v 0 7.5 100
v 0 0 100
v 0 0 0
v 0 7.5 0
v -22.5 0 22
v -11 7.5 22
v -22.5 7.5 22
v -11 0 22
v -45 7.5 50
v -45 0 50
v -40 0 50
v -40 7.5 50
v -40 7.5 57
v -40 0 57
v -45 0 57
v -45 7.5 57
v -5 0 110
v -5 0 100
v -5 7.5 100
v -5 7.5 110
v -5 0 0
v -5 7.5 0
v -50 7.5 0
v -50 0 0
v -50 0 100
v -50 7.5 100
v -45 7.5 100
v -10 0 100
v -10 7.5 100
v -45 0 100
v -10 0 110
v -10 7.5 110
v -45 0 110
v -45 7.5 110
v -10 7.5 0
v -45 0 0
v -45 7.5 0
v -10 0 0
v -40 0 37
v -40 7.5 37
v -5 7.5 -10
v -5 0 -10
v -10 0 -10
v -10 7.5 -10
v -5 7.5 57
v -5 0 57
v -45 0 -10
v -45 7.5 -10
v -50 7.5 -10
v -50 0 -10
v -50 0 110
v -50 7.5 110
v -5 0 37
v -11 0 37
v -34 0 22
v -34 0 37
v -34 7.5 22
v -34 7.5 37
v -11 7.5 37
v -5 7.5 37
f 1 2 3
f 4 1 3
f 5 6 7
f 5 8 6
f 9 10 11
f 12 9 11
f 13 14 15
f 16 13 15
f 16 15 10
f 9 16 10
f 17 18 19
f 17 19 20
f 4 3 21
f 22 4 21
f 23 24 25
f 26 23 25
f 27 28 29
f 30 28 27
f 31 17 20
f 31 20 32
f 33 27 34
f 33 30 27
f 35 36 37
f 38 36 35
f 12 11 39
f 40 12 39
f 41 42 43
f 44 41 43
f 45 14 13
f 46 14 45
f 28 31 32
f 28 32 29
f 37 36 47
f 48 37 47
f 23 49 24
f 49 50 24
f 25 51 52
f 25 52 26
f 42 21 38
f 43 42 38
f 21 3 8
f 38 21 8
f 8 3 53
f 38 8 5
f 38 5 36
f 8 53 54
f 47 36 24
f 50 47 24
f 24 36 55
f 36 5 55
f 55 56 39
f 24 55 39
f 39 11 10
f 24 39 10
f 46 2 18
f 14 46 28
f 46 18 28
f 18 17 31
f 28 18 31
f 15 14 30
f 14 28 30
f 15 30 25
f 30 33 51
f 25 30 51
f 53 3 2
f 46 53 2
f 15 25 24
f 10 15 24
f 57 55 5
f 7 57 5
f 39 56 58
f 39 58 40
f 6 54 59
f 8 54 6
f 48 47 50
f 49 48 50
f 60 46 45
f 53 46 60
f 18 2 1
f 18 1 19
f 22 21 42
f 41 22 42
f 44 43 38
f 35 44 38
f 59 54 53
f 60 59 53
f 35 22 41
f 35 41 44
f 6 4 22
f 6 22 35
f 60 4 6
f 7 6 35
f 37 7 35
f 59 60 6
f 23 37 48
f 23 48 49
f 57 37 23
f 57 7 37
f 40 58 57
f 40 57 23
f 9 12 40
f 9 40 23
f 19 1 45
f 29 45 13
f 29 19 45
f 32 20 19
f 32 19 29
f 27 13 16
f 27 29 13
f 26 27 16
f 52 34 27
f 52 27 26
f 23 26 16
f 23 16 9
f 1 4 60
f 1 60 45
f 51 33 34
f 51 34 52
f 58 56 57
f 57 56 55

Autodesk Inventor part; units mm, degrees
ref_plane "YZ Plane" through (0, 0, 0) normal (1, 0, 0) x (0, 1, 0)
ref_plane "XZ Plane" through (0, 0, 0) normal (0, 1, 0) x (-1, 0, 0)
ref_plane "XY Plane" through (0, 0, 0) normal (0, 0, 1) x (1, 0, 0)
sketch "Sketch1" plane through (0, 0, 0) normal (0, 1, 0) x (-1, 0, 0)
  line L0 (50, 0) -> (50, 100)
  line L1 (0, 100) -> (0, 0)
  line L2 (34, 37) -> (34, 22)
  line L3 (34, 22) -> (22.5, 22)
  line L4 (11, 37) -> (11, 22)
  line L5 (11, 22) -> (22.5, 22)
  line L6 (34, 37) -> (40, 37)
  line L7 (11, 37) -> (5, 37)
  line L8 (40, 57) -> (5, 57)
  line L9 (5, 57) -> (5, 37)
  line L10 (40, 57) -> (45, 57)
  line L11 (45, 57) -> (45, 50)
  line L12 (45, 50) -> (40, 50)
  line L13 (45, 100) -> (45, 110)
  line L14 (45, 110) -> (50, 110)
  line L15 (50, 110) -> (50, 100)
  line L16 (5, 100) -> (5, 110)
  line L17 (45, 0) -> (45, -10)
  line L18 (45, -10) -> (50, -10)
  line L19 (50, -10) -> (50, 0)
  line L20 (5, 0) -> (5, -10)
  line L21 (40, 50) -> (40, 37)
  line L22 (5, 110) -> (10, 110)
  line L23 (10, 110) -> (10, 100)
  line L24 (5, 100) -> (5, 110)
  line L25 (5, -10) -> (10, -10)
  line L26 (10, -10) -> (10, 0)
  line L27 (5, 0) -> (5, -10)
  line L28 (0, 100) -> (5, 100)
  line L29 (10, 100) -> (45, 100)
  line L30 (0, 0) -> (5, 0)
  line L31 (45, 0) -> (10, 0)
  dimension "d1" = 100
  dimension "d10" = 5
  dimension "d11" = 5
  dimension "d12" = 5
  dimension "d13" = 10
  dimension "d16" = 5
  dimension "d17" = 10
  dimension "d22" = 5
  dimension "d23" = 10
extrude "Extrusion1" add sketch "Sketch1" along normal blind 7.5
properties part number "2P.01.01.02.JW.AilSerCage" material "Wood (Maple)"
